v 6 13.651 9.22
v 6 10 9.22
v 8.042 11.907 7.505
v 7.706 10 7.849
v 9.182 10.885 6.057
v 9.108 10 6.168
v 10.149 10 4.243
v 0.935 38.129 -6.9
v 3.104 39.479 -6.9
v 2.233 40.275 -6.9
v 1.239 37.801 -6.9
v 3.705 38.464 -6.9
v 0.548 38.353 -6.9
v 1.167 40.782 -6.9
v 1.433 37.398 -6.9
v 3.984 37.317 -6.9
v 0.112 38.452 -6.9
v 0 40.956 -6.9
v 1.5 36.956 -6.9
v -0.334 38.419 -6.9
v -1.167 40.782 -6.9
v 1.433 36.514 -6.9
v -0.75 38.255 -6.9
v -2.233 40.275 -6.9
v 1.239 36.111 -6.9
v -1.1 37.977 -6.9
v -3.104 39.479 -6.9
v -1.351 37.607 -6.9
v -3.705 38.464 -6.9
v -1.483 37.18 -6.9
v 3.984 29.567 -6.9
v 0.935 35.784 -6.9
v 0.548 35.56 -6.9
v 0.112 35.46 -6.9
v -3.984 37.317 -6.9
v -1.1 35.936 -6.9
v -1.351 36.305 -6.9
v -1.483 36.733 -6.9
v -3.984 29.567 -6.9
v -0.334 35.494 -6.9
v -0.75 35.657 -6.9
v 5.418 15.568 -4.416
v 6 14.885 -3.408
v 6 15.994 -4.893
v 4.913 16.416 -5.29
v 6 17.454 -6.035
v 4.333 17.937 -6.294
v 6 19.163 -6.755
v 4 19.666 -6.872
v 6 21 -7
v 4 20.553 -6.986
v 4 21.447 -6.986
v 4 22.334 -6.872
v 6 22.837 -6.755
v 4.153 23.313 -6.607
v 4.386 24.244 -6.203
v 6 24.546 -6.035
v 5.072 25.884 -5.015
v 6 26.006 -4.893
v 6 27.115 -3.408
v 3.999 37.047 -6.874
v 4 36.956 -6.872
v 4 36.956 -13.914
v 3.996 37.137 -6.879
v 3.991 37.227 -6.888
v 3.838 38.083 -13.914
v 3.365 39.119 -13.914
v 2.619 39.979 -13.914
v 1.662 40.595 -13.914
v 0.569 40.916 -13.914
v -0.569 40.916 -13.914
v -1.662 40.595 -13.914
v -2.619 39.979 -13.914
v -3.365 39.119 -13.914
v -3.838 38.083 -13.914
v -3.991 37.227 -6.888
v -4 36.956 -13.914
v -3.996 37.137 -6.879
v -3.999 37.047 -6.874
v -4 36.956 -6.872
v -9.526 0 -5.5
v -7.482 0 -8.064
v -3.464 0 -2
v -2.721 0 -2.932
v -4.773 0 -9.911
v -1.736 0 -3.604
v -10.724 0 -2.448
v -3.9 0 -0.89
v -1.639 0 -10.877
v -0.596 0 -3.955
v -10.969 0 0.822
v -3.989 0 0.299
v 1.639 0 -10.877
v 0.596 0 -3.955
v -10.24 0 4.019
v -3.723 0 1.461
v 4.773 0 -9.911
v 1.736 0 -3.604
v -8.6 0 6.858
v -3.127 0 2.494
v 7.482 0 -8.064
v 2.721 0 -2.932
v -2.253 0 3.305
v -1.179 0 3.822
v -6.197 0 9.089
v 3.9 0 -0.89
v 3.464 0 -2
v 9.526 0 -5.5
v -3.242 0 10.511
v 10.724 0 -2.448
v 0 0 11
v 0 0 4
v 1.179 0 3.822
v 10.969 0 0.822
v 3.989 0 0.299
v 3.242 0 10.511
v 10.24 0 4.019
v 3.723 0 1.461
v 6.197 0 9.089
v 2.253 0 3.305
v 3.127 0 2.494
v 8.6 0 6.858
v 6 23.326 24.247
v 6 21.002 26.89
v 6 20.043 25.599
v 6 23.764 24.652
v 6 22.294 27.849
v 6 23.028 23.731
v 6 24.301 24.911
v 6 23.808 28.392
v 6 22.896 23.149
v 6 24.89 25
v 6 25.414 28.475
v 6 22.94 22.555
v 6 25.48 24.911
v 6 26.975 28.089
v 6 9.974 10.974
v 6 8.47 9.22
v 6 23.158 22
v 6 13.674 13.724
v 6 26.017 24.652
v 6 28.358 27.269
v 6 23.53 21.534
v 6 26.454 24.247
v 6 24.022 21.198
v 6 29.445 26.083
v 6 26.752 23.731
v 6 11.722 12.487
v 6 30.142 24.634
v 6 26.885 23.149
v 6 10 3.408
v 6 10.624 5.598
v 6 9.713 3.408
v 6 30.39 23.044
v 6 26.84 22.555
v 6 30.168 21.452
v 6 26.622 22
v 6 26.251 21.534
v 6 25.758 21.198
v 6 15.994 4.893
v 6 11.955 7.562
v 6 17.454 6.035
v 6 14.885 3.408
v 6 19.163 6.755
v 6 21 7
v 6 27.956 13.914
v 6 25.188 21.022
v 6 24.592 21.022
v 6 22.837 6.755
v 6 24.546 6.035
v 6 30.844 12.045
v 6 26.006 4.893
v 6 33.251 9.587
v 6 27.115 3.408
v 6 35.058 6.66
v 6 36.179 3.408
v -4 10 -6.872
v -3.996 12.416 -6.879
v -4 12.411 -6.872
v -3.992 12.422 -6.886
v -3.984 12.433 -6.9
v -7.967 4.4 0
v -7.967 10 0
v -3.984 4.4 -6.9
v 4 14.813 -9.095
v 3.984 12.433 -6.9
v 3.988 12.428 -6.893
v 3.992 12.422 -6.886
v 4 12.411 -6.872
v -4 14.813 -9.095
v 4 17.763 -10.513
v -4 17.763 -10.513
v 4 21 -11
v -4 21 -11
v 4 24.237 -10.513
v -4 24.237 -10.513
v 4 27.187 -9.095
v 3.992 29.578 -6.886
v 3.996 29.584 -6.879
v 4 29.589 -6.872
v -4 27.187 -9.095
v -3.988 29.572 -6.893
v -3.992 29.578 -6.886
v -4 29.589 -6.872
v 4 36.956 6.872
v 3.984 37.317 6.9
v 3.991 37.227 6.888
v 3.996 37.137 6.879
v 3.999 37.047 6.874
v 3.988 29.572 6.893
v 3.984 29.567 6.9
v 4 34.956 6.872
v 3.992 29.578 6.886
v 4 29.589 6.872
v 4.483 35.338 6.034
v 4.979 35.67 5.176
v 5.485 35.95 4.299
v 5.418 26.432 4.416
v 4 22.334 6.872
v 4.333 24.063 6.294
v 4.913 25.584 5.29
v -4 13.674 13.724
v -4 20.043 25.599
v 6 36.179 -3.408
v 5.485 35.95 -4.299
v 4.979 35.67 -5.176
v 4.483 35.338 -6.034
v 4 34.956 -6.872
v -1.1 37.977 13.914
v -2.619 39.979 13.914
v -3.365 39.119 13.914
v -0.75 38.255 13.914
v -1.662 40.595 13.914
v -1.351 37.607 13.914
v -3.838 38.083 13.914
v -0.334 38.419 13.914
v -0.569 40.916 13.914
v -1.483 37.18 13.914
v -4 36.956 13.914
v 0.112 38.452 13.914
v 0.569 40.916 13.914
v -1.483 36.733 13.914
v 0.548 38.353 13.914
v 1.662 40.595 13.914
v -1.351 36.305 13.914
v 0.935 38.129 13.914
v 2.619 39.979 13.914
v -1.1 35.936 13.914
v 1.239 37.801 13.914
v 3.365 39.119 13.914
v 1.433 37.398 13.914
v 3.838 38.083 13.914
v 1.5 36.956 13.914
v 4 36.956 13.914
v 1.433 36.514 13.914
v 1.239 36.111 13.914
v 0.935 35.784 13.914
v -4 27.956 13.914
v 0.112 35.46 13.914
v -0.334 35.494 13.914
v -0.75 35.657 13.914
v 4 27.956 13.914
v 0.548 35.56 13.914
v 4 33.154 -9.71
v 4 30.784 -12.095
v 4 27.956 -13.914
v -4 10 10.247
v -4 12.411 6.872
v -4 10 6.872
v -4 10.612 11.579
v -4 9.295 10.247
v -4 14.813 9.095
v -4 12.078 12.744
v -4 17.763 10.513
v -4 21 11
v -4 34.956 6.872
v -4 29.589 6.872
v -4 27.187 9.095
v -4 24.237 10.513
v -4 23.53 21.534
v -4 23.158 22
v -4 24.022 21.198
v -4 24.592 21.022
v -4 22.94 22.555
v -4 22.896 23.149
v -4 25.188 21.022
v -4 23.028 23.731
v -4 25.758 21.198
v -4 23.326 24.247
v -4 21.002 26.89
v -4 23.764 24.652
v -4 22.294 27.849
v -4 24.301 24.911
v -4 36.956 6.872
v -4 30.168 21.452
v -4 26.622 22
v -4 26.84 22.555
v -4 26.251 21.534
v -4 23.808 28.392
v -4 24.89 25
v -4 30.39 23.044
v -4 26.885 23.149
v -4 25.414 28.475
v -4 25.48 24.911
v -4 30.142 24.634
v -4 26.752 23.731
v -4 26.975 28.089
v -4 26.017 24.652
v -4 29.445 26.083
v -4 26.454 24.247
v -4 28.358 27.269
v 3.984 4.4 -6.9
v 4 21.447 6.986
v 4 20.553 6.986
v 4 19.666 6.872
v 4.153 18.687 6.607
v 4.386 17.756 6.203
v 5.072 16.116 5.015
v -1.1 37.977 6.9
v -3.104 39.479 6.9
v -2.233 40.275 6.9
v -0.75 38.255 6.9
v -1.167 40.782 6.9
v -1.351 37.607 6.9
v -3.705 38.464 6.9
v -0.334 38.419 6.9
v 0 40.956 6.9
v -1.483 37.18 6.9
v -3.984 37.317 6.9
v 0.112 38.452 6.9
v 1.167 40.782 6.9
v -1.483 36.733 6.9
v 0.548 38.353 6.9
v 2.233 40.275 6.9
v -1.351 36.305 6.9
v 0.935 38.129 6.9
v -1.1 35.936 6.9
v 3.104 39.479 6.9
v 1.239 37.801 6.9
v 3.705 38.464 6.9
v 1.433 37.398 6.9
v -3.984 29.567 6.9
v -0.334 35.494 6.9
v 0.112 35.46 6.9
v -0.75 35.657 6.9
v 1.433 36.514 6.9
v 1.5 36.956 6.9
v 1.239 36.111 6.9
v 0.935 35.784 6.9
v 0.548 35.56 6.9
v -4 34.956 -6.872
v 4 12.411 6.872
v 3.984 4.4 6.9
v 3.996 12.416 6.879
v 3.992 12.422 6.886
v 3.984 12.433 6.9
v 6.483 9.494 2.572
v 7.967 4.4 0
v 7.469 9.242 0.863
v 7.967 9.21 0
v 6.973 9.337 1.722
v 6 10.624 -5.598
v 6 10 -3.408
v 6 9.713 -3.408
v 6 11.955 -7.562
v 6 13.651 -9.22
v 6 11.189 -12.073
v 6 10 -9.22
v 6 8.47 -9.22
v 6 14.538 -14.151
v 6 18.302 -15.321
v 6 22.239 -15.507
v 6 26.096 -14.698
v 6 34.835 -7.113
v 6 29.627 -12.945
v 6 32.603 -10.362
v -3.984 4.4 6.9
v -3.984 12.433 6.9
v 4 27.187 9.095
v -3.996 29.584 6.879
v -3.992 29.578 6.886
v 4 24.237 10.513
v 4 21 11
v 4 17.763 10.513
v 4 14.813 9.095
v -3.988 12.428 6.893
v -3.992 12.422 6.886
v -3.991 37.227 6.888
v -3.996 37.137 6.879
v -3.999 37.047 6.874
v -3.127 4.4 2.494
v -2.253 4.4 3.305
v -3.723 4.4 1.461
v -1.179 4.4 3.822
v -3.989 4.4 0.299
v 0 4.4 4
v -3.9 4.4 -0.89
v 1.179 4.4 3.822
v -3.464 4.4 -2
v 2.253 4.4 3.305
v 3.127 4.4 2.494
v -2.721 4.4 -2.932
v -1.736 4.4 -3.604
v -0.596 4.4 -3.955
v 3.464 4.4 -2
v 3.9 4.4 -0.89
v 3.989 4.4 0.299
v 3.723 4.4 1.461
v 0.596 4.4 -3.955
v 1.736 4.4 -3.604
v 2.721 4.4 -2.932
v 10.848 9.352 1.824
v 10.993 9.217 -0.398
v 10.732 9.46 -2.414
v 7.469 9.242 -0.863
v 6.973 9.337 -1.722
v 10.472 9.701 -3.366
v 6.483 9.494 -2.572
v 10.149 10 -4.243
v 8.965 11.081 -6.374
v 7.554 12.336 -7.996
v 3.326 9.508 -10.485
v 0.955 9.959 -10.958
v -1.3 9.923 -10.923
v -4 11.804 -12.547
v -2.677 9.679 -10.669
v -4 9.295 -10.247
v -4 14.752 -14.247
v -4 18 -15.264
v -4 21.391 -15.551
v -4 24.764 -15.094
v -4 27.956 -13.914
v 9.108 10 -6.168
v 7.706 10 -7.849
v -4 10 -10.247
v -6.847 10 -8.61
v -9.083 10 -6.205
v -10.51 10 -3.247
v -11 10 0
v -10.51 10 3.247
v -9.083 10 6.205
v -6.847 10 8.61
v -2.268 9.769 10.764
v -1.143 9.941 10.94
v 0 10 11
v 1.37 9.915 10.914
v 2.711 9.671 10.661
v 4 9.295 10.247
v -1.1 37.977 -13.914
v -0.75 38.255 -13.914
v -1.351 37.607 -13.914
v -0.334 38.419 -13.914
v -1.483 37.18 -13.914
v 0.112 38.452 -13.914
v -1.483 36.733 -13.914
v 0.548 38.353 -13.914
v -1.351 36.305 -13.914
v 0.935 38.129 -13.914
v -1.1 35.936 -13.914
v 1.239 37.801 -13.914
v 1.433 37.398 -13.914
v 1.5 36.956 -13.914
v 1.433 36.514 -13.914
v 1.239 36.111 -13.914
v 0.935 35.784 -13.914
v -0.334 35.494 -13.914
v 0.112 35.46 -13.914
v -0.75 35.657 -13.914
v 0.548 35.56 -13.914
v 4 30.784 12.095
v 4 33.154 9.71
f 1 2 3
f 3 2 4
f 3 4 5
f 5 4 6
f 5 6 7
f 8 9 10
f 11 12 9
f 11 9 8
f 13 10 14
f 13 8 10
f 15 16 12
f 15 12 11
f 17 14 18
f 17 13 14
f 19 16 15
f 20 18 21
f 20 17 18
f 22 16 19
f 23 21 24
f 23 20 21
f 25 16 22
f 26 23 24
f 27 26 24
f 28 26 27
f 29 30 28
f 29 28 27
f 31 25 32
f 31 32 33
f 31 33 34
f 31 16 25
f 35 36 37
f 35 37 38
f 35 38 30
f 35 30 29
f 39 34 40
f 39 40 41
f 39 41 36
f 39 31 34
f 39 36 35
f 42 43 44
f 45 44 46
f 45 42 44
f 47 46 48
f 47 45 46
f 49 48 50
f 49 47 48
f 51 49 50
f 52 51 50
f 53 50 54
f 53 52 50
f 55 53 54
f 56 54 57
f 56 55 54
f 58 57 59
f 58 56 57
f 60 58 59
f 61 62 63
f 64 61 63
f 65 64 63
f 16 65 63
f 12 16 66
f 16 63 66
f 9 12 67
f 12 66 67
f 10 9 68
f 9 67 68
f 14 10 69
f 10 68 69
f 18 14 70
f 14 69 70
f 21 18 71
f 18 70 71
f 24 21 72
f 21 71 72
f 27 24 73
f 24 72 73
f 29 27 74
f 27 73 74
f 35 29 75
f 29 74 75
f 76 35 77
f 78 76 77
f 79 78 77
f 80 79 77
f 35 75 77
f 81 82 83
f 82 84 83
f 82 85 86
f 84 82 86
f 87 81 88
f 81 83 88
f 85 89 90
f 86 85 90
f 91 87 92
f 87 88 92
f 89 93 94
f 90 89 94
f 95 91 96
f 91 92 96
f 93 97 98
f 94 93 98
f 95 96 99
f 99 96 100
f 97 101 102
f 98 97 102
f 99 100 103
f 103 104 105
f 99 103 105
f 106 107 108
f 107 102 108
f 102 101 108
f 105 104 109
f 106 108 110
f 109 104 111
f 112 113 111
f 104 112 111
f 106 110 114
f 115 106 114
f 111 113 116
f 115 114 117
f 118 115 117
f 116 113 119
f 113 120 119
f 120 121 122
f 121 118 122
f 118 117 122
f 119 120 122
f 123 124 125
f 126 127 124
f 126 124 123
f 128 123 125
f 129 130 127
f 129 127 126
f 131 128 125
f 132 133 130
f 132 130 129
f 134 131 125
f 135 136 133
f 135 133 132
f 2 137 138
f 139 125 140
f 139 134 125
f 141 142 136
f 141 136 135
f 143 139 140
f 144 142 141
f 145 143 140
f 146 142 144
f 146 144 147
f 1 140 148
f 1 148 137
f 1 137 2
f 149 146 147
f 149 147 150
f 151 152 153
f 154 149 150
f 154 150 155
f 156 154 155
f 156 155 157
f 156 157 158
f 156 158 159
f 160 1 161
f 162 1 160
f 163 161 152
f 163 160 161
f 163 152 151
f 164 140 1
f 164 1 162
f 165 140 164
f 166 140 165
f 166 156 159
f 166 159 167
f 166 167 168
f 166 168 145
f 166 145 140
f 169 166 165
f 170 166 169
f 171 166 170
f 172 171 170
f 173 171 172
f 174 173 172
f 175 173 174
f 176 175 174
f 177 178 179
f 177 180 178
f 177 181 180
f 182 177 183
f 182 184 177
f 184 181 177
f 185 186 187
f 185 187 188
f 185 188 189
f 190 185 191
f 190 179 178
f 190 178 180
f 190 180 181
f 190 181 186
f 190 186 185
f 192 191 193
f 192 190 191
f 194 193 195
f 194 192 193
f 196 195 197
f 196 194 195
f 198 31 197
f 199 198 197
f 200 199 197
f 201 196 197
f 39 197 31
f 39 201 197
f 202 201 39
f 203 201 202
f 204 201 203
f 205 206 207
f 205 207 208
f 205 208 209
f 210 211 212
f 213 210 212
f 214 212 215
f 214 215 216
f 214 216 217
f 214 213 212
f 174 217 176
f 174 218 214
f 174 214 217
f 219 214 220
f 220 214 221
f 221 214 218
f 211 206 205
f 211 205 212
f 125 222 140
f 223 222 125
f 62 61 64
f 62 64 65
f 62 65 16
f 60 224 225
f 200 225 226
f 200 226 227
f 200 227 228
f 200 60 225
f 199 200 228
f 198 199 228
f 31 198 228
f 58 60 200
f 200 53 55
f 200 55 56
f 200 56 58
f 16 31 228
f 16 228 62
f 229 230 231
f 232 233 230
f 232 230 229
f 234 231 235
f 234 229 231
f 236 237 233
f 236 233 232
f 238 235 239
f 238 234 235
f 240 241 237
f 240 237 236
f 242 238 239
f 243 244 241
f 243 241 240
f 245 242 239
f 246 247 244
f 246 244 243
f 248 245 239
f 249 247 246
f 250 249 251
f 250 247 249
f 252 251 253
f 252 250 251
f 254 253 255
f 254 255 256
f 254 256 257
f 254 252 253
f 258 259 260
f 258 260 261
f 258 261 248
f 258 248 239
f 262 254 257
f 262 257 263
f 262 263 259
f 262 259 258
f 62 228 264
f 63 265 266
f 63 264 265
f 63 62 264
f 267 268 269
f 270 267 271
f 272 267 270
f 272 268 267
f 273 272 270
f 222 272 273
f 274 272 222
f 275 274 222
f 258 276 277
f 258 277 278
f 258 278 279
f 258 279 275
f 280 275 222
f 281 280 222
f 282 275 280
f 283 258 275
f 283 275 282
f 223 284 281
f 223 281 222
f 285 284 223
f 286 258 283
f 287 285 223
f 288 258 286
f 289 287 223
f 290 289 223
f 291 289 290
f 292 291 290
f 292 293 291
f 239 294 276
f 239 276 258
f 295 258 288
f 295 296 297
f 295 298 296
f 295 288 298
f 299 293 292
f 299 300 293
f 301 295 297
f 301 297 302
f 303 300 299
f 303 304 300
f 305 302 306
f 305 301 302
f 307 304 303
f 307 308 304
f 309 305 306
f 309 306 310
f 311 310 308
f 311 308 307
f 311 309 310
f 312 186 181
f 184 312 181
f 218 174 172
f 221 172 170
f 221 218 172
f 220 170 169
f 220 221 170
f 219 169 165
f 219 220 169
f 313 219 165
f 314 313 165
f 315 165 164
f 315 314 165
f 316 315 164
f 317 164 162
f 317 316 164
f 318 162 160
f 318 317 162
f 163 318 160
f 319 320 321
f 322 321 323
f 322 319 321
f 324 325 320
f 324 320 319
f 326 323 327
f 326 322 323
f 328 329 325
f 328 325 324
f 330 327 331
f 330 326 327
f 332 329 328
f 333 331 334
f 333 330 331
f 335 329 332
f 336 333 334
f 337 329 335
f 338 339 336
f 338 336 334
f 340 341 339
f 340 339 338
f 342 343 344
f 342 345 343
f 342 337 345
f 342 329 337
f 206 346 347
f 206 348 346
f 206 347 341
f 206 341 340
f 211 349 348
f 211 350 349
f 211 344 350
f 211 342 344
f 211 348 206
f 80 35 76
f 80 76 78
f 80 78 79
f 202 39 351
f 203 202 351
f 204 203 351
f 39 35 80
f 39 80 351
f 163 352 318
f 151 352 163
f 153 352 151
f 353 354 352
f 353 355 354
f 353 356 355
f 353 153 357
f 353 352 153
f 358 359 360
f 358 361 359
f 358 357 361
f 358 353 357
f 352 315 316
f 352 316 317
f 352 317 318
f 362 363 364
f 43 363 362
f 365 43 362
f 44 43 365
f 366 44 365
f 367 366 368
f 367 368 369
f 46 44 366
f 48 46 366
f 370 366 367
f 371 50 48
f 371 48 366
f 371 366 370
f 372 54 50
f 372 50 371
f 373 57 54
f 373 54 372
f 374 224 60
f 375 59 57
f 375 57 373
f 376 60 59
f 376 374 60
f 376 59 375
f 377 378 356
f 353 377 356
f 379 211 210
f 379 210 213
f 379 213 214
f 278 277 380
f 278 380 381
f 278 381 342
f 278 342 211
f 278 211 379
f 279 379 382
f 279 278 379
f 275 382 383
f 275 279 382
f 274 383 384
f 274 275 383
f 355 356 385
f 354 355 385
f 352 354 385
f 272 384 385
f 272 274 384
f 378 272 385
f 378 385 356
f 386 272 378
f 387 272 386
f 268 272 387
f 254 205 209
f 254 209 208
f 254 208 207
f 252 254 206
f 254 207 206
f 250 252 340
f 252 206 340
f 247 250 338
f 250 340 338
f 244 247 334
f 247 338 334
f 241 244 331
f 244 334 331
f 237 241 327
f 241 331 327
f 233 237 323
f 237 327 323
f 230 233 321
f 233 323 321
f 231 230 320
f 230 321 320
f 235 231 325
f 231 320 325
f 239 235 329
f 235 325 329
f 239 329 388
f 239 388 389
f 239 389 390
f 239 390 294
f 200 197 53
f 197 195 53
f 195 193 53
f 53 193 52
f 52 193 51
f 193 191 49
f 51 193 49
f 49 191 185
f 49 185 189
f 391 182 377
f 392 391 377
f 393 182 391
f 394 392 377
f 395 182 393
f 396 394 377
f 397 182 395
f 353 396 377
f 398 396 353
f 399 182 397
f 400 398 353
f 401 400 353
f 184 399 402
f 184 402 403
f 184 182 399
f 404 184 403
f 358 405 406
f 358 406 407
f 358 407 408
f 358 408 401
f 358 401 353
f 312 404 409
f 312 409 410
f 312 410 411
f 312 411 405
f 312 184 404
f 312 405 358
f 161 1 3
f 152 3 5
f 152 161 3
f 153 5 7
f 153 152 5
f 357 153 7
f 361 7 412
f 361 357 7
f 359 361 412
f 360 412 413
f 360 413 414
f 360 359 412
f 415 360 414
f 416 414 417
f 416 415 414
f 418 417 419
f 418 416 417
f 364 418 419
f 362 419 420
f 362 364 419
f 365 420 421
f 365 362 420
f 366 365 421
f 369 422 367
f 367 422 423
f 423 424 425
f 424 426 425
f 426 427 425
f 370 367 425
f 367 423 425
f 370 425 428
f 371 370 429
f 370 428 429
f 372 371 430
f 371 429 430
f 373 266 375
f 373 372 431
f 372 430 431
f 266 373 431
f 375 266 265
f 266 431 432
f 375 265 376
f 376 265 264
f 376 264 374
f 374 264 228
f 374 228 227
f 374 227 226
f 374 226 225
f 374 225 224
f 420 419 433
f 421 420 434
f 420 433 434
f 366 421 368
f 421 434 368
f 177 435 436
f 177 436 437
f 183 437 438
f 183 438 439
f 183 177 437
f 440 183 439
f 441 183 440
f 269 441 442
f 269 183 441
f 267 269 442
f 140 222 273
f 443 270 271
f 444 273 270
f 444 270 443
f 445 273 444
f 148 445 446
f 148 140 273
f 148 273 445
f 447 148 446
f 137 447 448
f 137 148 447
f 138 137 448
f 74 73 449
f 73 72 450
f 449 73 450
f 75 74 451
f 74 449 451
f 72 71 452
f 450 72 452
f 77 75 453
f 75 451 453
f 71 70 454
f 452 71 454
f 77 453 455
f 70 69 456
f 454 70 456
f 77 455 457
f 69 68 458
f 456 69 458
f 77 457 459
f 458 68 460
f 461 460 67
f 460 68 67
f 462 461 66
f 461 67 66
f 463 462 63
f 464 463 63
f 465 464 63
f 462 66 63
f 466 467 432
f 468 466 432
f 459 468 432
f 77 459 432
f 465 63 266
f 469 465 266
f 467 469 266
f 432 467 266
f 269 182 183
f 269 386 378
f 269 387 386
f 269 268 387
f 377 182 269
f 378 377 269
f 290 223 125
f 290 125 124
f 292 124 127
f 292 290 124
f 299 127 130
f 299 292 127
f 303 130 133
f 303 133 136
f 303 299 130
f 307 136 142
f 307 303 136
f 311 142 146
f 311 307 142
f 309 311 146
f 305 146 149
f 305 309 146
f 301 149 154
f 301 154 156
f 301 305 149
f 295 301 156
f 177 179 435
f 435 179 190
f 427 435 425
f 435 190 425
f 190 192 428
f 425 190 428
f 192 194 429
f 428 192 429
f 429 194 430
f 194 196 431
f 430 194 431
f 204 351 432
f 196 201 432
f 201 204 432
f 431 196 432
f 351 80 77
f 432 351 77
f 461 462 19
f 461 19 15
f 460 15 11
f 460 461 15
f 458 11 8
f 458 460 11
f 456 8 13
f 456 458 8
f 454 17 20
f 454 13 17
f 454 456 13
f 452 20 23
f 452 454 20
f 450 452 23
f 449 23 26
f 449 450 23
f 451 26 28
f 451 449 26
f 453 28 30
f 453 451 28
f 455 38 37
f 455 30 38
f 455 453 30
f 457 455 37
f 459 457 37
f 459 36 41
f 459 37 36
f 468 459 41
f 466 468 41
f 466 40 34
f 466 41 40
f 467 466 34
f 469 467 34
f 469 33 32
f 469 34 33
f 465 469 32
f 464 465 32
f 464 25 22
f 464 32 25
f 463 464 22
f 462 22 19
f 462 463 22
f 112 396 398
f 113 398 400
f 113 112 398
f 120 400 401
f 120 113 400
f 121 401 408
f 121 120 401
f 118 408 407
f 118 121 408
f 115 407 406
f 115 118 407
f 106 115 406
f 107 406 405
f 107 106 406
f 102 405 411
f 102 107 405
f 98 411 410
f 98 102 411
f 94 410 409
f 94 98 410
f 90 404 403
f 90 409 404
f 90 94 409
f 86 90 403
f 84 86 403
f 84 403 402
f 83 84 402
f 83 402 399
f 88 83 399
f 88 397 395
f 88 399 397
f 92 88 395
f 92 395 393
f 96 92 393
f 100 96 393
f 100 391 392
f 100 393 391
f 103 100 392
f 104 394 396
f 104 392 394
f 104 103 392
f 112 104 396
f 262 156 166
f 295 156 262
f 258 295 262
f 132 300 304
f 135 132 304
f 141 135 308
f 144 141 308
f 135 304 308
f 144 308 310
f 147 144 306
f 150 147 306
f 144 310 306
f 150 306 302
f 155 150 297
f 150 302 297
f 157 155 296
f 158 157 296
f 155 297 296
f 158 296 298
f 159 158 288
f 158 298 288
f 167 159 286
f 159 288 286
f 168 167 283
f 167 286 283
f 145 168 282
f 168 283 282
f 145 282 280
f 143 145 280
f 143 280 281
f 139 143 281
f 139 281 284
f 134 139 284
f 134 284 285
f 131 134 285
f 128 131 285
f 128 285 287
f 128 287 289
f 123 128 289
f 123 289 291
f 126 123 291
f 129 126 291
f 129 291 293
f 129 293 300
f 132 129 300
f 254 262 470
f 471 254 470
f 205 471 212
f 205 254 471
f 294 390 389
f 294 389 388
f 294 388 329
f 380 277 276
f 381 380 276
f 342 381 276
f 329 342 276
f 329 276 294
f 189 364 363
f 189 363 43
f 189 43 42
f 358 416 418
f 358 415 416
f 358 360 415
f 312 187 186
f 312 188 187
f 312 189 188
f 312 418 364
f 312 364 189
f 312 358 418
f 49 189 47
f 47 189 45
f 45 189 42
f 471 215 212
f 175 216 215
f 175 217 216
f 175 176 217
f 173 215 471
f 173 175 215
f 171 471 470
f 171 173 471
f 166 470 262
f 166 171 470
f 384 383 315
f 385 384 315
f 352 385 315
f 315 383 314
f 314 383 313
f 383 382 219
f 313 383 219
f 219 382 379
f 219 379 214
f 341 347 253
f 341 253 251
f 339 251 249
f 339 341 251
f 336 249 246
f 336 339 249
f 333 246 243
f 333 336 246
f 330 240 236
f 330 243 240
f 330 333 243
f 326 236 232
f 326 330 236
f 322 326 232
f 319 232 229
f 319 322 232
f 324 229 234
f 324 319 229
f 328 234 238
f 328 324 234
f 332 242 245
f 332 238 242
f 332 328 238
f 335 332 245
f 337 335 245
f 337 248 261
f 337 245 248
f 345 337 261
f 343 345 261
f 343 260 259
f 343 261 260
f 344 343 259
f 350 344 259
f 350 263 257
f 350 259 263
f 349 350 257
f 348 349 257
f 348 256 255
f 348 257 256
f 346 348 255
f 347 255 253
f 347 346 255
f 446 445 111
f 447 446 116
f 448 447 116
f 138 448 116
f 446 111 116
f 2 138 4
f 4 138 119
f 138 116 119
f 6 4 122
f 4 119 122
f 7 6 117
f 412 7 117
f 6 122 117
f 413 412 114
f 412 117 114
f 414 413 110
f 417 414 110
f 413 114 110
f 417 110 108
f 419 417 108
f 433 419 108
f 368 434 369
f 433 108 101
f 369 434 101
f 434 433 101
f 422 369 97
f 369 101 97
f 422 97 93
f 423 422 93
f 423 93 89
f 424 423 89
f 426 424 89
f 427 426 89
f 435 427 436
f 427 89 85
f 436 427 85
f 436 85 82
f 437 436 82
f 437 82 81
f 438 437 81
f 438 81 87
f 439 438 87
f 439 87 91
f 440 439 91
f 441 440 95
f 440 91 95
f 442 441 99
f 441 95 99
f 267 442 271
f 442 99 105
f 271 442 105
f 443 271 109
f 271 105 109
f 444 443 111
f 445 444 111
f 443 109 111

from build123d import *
from build123d.topology import SkipClean

# Parameters (mm, degrees)
SKETCH1_R               = 11
SKETCH1_R_2             = 4
BOSS_EXTRUDE1_DEPTH     = 10
SKETCH3_R               = 15.556349186
SKETCH3_R_2             = 11
BOSS_EXTRUDE2_DEPTH     = 4
CUT_EXTRUDE1_DEPTH      = 33.68393631
CUT_EXTRUDE1_DEPTH_BACK = 5.6
BOSS_EXTRUDE4_DEPTH     = 10
BOSS_EXTRUDE3_DEPTH     = 8
BOSS_EXTRUDE5_START     = 4
SKETCH3_2_R             = 15.556349186
SKETCH3_2_R_2           = 11
BOSS_EXTRUDE5_DEPTH     = 2
CUT_EXTRUDE2_DEPTH      = 37.349590584
CUT_EXTRUDE2_DEPTH_BACK = 5.6
CUT_EXTRUDE3_DEPTH      = 47.993816701
CUT_EXTRUDE3_DEPTH_BACK = 47.993816701
SKETCH13_R              = 7
CUT_EXTRUDE5_DEPTH      = 52.642447787
CUT_EXTRUDE5_DEPTH_BACK = 52.642447787
SKETCH14_R              = 1.5
SKETCH15_R              = 11.789942891
CUT_EXTRUDE6_DEPTH      = 8
BOSS_EXTRUDE6_REACH     = 48.308
SKETCH16_R              = 2


with BuildPart() as part:
    # Sketch1 → Boss-Extrude1 (new body)
    with BuildSketch(Plane(origin=(0, 0, 0), x_dir=(1, 0, 0), z_dir=(0, 1, 0))):
        with Locations(Location((0, 0, 0), (0, 0, 270))):
            Circle(SKETCH1_R)
        with Locations(Location((0, 0, 0), (0, 0, 270))):
            Circle(SKETCH1_R_2, mode=Mode.SUBTRACT)
    extrude(amount=BOSS_EXTRUDE1_DEPTH)

    # Sketch3 → Boss-Extrude2 (add, symmetric)
    with BuildSketch(Plane(origin=(0, 0, 0), x_dir=(0, 0, -1), z_dir=(1, 0, 0))):
        with Locations((0, 21)):
            Circle(SKETCH3_R)
        with Locations(Location((0, 21, 0), (0, 0, 270))):
            Circle(SKETCH3_R_2, mode=Mode.SUBTRACT)
    extrude(amount=BOSS_EXTRUDE2_DEPTH, both=True)

    # Sketch2 → Cut-Extrude1 (cut, two sides: drawn at the far end of the back side and taken through both)
    with BuildSketch(Plane(origin=(0, 10, 0), x_dir=(1, 0, 0), z_dir=(0, 1, 0)).offset(-CUT_EXTRUDE1_DEPTH_BACK)):
        Polygon((3.983716857, 6.9), (-3.983716857, 6.9), (-7.967433715, 0), (-3.983716857, -6.9), (3.983716857, -6.9), (7.967433715, 0), align=None)
    extrude(amount=CUT_EXTRUDE1_DEPTH + CUT_EXTRUDE1_DEPTH_BACK, mode=Mode.SUBTRACT)

    # Sketch9 → Boss-Extrude4 (add)
    with BuildSketch(Plane(origin=(0, 10, 0), x_dir=(1, 0, 0), z_dir=(0, 1, 0))):
        with BuildLine():
            ThreePointArc((4, -10.246950766), (11, 0), (4, 10.246950766))
            Line((4, 10.246950766), (4, 6.87179677))
            Line((4, 6.87179677), (7.967433715, 0))
            Line((7.967433715, 0), (4, -6.87179677))
            Line((4, -6.87179677), (4, -10.246950766))
        make_face()
    extrude(amount=BOSS_EXTRUDE4_DEPTH)

    # Sketch4 → Boss-Extrude3 (add)
    with BuildSketch(Plane(origin=(4, 0, 0), x_dir=(0, 0, -1), z_dir=(1, 0, 0))):
        with BuildLine():
            Line((-6.87179677, 34.956303563), (-6.87179677, 40.956303563))
            Line((-6.87179677, 40.956303563), (-13.914375327, 40.956303563))
            Line((-13.914375327, 40.956303563), (-13.914375327, 27.956303563))
            ThreePointArc((-13.914375327, 27.956303563), (-10.966596446, 32.033302425), (-6.87179677, 34.956303563))
        make_face()
        with BuildLine():
            Line((6.87179677, 34.956303563), (6.87179677, 40.956303563))
            Line((6.87179677, 40.956303563), (13.914375327, 40.956303563))
            Line((13.914375327, 40.956303563), (13.914375327, 27.956303563))
            ThreePointArc((13.914375327, 27.956303563), (10.966596446, 32.033302425), (6.87179677, 34.956303563))
        make_face()
    extrude(amount=-BOSS_EXTRUDE3_DEPTH)

    # Sketch3<2> → Boss-Extrude5 (add)
    # profile 1 of 2: a face of its own
    with SkipClean():  # the faces are left unmerged after this step: merging them gives an invalid solid
        with BuildSketch(Plane(origin=(0, 0, 0), x_dir=(0, 0, -1), z_dir=(1, 0, 0)).offset(BOSS_EXTRUDE5_START)):
            with Locations((0, 21)):
                Circle(SKETCH3_2_R)
            with Locations((0, 21)):
                Circle(SKETCH3_2_R_2, mode=Mode.SUBTRACT)
        # profile 2 of 2: a face of its own
        with BuildSketch(Plane(origin=(0, 0, 0), x_dir=(0, 0, -1), z_dir=(1, 0, 0)).offset(BOSS_EXTRUDE5_START)):
            with Locations((0, 21)):
                Circle(SKETCH3_2_R_2)
        extrude(amount=BOSS_EXTRUDE5_DEPTH)
    add(part.part.scale(1), mode=Mode.REPLACE)  # the faces are merged on a copy

    # Sketch2<2> → Cut-Extrude2 (cut, two sides: drawn at the far end of the back side and taken through both)
    with BuildSketch(Plane(origin=(0, 10, 0), x_dir=(1, 0, 0), z_dir=(0, 1, 0)).offset(-CUT_EXTRUDE2_DEPTH_BACK)):
        Polygon((3.983716857, 6.9), (-3.983716857, 6.9), (-7.967433715, 0), (-3.983716857, -6.9), (3.983716857, -6.9), (7.967433715, 0), align=None)
    extrude(amount=CUT_EXTRUDE2_DEPTH + CUT_EXTRUDE2_DEPTH_BACK, mode=Mode.SUBTRACT)

    # Sketch13 → Cut-Extrude3 (cut, two sides: drawn at the far end of the back side and taken through both)
    with BuildSketch(Plane(origin=(6, 0, 0), x_dir=(0, 0, -1), z_dir=(1, 0, 0)).offset(-CUT_EXTRUDE3_DEPTH_BACK)):
        with Locations((0, 21)):
            Circle(SKETCH13_R)
    extrude(amount=CUT_EXTRUDE3_DEPTH + CUT_EXTRUDE3_DEPTH_BACK, mode=Mode.SUBTRACT)

    # Sketch14 → Cut-Extrude5 (cut, two sides: drawn at the far end of the back side and taken through both)
    with BuildSketch(Plane.XY.offset(13.914375327).offset(-CUT_EXTRUDE5_DEPTH_BACK)):
        with Locations((0, 36.956303563)):
            Circle(SKETCH14_R)
        with BuildLine():
            Line((-4, 36.956303563), (-4, 43.473651887))
            Line((-4, 43.473651887), (4, 43.473651887))
            Line((4, 43.473651887), (4, 36.956303563))
            ThreePointArc((4, 36.956303563), (0, 40.956303563), (-4, 36.956303563))
        make_face()
    extrude(amount=CUT_EXTRUDE5_DEPTH + CUT_EXTRUDE5_DEPTH_BACK, mode=Mode.SUBTRACT)

    # Sketch15 → Cut-Extrude6 (cut)
    with BuildSketch(Plane(origin=(6, 0, 0), x_dir=(0, 0, -1), z_dir=(1, 0, 0))):
        with Locations((0, 21)):
            Circle(SKETCH15_R)
    extrude(amount=CUT_EXTRUDE6_DEPTH, mode=Mode.SUBTRACT)

    # Boss-Extrude6: up to this face of the body (flat: up to its plane)
    boss_extrude6_end = Plane(part.part.faces().sort_by_distance((6, 22.369931635, -9.227258585))[0])
    # Sketch16 → Boss-Extrude6 (add, up to the picked face)
    with BuildSketch(Plane.ZY.offset(4), mode=Mode.PRIVATE) as boss_extrude6_sk1:
        with BuildLine():
            Line((13.723567505, 13.674449171), (25.599337953, 20.043155389))
            ThreePointArc((25.599337953, 20.043155389), (28.089469493, 26.975176866), (21.451586712, 30.167697662))
            Line((21.451586712, 30.167697662), (13.914375327, 27.956303563))
            ThreePointArc((13.914375327, 27.956303563), (15.554961016, 20.792183273), (13.723567505, 13.674449171))
        make_face()
        with Locations((23, 24.890158814)):
            Circle(SKETCH16_R, mode=Mode.SUBTRACT)
    boss_extrude6_tool1 = split(extrude(boss_extrude6_sk1.sketch, amount=-BOSS_EXTRUDE6_REACH, mode=Mode.PRIVATE), bisect_by=boss_extrude6_end, keep=Keep.BOTH, mode=Mode.PRIVATE)
    add(boss_extrude6_tool1.solids().sort_by(Axis((-4, 23.412763, 20.74002), (1, 0, 0)))[0])


solid = part.part
